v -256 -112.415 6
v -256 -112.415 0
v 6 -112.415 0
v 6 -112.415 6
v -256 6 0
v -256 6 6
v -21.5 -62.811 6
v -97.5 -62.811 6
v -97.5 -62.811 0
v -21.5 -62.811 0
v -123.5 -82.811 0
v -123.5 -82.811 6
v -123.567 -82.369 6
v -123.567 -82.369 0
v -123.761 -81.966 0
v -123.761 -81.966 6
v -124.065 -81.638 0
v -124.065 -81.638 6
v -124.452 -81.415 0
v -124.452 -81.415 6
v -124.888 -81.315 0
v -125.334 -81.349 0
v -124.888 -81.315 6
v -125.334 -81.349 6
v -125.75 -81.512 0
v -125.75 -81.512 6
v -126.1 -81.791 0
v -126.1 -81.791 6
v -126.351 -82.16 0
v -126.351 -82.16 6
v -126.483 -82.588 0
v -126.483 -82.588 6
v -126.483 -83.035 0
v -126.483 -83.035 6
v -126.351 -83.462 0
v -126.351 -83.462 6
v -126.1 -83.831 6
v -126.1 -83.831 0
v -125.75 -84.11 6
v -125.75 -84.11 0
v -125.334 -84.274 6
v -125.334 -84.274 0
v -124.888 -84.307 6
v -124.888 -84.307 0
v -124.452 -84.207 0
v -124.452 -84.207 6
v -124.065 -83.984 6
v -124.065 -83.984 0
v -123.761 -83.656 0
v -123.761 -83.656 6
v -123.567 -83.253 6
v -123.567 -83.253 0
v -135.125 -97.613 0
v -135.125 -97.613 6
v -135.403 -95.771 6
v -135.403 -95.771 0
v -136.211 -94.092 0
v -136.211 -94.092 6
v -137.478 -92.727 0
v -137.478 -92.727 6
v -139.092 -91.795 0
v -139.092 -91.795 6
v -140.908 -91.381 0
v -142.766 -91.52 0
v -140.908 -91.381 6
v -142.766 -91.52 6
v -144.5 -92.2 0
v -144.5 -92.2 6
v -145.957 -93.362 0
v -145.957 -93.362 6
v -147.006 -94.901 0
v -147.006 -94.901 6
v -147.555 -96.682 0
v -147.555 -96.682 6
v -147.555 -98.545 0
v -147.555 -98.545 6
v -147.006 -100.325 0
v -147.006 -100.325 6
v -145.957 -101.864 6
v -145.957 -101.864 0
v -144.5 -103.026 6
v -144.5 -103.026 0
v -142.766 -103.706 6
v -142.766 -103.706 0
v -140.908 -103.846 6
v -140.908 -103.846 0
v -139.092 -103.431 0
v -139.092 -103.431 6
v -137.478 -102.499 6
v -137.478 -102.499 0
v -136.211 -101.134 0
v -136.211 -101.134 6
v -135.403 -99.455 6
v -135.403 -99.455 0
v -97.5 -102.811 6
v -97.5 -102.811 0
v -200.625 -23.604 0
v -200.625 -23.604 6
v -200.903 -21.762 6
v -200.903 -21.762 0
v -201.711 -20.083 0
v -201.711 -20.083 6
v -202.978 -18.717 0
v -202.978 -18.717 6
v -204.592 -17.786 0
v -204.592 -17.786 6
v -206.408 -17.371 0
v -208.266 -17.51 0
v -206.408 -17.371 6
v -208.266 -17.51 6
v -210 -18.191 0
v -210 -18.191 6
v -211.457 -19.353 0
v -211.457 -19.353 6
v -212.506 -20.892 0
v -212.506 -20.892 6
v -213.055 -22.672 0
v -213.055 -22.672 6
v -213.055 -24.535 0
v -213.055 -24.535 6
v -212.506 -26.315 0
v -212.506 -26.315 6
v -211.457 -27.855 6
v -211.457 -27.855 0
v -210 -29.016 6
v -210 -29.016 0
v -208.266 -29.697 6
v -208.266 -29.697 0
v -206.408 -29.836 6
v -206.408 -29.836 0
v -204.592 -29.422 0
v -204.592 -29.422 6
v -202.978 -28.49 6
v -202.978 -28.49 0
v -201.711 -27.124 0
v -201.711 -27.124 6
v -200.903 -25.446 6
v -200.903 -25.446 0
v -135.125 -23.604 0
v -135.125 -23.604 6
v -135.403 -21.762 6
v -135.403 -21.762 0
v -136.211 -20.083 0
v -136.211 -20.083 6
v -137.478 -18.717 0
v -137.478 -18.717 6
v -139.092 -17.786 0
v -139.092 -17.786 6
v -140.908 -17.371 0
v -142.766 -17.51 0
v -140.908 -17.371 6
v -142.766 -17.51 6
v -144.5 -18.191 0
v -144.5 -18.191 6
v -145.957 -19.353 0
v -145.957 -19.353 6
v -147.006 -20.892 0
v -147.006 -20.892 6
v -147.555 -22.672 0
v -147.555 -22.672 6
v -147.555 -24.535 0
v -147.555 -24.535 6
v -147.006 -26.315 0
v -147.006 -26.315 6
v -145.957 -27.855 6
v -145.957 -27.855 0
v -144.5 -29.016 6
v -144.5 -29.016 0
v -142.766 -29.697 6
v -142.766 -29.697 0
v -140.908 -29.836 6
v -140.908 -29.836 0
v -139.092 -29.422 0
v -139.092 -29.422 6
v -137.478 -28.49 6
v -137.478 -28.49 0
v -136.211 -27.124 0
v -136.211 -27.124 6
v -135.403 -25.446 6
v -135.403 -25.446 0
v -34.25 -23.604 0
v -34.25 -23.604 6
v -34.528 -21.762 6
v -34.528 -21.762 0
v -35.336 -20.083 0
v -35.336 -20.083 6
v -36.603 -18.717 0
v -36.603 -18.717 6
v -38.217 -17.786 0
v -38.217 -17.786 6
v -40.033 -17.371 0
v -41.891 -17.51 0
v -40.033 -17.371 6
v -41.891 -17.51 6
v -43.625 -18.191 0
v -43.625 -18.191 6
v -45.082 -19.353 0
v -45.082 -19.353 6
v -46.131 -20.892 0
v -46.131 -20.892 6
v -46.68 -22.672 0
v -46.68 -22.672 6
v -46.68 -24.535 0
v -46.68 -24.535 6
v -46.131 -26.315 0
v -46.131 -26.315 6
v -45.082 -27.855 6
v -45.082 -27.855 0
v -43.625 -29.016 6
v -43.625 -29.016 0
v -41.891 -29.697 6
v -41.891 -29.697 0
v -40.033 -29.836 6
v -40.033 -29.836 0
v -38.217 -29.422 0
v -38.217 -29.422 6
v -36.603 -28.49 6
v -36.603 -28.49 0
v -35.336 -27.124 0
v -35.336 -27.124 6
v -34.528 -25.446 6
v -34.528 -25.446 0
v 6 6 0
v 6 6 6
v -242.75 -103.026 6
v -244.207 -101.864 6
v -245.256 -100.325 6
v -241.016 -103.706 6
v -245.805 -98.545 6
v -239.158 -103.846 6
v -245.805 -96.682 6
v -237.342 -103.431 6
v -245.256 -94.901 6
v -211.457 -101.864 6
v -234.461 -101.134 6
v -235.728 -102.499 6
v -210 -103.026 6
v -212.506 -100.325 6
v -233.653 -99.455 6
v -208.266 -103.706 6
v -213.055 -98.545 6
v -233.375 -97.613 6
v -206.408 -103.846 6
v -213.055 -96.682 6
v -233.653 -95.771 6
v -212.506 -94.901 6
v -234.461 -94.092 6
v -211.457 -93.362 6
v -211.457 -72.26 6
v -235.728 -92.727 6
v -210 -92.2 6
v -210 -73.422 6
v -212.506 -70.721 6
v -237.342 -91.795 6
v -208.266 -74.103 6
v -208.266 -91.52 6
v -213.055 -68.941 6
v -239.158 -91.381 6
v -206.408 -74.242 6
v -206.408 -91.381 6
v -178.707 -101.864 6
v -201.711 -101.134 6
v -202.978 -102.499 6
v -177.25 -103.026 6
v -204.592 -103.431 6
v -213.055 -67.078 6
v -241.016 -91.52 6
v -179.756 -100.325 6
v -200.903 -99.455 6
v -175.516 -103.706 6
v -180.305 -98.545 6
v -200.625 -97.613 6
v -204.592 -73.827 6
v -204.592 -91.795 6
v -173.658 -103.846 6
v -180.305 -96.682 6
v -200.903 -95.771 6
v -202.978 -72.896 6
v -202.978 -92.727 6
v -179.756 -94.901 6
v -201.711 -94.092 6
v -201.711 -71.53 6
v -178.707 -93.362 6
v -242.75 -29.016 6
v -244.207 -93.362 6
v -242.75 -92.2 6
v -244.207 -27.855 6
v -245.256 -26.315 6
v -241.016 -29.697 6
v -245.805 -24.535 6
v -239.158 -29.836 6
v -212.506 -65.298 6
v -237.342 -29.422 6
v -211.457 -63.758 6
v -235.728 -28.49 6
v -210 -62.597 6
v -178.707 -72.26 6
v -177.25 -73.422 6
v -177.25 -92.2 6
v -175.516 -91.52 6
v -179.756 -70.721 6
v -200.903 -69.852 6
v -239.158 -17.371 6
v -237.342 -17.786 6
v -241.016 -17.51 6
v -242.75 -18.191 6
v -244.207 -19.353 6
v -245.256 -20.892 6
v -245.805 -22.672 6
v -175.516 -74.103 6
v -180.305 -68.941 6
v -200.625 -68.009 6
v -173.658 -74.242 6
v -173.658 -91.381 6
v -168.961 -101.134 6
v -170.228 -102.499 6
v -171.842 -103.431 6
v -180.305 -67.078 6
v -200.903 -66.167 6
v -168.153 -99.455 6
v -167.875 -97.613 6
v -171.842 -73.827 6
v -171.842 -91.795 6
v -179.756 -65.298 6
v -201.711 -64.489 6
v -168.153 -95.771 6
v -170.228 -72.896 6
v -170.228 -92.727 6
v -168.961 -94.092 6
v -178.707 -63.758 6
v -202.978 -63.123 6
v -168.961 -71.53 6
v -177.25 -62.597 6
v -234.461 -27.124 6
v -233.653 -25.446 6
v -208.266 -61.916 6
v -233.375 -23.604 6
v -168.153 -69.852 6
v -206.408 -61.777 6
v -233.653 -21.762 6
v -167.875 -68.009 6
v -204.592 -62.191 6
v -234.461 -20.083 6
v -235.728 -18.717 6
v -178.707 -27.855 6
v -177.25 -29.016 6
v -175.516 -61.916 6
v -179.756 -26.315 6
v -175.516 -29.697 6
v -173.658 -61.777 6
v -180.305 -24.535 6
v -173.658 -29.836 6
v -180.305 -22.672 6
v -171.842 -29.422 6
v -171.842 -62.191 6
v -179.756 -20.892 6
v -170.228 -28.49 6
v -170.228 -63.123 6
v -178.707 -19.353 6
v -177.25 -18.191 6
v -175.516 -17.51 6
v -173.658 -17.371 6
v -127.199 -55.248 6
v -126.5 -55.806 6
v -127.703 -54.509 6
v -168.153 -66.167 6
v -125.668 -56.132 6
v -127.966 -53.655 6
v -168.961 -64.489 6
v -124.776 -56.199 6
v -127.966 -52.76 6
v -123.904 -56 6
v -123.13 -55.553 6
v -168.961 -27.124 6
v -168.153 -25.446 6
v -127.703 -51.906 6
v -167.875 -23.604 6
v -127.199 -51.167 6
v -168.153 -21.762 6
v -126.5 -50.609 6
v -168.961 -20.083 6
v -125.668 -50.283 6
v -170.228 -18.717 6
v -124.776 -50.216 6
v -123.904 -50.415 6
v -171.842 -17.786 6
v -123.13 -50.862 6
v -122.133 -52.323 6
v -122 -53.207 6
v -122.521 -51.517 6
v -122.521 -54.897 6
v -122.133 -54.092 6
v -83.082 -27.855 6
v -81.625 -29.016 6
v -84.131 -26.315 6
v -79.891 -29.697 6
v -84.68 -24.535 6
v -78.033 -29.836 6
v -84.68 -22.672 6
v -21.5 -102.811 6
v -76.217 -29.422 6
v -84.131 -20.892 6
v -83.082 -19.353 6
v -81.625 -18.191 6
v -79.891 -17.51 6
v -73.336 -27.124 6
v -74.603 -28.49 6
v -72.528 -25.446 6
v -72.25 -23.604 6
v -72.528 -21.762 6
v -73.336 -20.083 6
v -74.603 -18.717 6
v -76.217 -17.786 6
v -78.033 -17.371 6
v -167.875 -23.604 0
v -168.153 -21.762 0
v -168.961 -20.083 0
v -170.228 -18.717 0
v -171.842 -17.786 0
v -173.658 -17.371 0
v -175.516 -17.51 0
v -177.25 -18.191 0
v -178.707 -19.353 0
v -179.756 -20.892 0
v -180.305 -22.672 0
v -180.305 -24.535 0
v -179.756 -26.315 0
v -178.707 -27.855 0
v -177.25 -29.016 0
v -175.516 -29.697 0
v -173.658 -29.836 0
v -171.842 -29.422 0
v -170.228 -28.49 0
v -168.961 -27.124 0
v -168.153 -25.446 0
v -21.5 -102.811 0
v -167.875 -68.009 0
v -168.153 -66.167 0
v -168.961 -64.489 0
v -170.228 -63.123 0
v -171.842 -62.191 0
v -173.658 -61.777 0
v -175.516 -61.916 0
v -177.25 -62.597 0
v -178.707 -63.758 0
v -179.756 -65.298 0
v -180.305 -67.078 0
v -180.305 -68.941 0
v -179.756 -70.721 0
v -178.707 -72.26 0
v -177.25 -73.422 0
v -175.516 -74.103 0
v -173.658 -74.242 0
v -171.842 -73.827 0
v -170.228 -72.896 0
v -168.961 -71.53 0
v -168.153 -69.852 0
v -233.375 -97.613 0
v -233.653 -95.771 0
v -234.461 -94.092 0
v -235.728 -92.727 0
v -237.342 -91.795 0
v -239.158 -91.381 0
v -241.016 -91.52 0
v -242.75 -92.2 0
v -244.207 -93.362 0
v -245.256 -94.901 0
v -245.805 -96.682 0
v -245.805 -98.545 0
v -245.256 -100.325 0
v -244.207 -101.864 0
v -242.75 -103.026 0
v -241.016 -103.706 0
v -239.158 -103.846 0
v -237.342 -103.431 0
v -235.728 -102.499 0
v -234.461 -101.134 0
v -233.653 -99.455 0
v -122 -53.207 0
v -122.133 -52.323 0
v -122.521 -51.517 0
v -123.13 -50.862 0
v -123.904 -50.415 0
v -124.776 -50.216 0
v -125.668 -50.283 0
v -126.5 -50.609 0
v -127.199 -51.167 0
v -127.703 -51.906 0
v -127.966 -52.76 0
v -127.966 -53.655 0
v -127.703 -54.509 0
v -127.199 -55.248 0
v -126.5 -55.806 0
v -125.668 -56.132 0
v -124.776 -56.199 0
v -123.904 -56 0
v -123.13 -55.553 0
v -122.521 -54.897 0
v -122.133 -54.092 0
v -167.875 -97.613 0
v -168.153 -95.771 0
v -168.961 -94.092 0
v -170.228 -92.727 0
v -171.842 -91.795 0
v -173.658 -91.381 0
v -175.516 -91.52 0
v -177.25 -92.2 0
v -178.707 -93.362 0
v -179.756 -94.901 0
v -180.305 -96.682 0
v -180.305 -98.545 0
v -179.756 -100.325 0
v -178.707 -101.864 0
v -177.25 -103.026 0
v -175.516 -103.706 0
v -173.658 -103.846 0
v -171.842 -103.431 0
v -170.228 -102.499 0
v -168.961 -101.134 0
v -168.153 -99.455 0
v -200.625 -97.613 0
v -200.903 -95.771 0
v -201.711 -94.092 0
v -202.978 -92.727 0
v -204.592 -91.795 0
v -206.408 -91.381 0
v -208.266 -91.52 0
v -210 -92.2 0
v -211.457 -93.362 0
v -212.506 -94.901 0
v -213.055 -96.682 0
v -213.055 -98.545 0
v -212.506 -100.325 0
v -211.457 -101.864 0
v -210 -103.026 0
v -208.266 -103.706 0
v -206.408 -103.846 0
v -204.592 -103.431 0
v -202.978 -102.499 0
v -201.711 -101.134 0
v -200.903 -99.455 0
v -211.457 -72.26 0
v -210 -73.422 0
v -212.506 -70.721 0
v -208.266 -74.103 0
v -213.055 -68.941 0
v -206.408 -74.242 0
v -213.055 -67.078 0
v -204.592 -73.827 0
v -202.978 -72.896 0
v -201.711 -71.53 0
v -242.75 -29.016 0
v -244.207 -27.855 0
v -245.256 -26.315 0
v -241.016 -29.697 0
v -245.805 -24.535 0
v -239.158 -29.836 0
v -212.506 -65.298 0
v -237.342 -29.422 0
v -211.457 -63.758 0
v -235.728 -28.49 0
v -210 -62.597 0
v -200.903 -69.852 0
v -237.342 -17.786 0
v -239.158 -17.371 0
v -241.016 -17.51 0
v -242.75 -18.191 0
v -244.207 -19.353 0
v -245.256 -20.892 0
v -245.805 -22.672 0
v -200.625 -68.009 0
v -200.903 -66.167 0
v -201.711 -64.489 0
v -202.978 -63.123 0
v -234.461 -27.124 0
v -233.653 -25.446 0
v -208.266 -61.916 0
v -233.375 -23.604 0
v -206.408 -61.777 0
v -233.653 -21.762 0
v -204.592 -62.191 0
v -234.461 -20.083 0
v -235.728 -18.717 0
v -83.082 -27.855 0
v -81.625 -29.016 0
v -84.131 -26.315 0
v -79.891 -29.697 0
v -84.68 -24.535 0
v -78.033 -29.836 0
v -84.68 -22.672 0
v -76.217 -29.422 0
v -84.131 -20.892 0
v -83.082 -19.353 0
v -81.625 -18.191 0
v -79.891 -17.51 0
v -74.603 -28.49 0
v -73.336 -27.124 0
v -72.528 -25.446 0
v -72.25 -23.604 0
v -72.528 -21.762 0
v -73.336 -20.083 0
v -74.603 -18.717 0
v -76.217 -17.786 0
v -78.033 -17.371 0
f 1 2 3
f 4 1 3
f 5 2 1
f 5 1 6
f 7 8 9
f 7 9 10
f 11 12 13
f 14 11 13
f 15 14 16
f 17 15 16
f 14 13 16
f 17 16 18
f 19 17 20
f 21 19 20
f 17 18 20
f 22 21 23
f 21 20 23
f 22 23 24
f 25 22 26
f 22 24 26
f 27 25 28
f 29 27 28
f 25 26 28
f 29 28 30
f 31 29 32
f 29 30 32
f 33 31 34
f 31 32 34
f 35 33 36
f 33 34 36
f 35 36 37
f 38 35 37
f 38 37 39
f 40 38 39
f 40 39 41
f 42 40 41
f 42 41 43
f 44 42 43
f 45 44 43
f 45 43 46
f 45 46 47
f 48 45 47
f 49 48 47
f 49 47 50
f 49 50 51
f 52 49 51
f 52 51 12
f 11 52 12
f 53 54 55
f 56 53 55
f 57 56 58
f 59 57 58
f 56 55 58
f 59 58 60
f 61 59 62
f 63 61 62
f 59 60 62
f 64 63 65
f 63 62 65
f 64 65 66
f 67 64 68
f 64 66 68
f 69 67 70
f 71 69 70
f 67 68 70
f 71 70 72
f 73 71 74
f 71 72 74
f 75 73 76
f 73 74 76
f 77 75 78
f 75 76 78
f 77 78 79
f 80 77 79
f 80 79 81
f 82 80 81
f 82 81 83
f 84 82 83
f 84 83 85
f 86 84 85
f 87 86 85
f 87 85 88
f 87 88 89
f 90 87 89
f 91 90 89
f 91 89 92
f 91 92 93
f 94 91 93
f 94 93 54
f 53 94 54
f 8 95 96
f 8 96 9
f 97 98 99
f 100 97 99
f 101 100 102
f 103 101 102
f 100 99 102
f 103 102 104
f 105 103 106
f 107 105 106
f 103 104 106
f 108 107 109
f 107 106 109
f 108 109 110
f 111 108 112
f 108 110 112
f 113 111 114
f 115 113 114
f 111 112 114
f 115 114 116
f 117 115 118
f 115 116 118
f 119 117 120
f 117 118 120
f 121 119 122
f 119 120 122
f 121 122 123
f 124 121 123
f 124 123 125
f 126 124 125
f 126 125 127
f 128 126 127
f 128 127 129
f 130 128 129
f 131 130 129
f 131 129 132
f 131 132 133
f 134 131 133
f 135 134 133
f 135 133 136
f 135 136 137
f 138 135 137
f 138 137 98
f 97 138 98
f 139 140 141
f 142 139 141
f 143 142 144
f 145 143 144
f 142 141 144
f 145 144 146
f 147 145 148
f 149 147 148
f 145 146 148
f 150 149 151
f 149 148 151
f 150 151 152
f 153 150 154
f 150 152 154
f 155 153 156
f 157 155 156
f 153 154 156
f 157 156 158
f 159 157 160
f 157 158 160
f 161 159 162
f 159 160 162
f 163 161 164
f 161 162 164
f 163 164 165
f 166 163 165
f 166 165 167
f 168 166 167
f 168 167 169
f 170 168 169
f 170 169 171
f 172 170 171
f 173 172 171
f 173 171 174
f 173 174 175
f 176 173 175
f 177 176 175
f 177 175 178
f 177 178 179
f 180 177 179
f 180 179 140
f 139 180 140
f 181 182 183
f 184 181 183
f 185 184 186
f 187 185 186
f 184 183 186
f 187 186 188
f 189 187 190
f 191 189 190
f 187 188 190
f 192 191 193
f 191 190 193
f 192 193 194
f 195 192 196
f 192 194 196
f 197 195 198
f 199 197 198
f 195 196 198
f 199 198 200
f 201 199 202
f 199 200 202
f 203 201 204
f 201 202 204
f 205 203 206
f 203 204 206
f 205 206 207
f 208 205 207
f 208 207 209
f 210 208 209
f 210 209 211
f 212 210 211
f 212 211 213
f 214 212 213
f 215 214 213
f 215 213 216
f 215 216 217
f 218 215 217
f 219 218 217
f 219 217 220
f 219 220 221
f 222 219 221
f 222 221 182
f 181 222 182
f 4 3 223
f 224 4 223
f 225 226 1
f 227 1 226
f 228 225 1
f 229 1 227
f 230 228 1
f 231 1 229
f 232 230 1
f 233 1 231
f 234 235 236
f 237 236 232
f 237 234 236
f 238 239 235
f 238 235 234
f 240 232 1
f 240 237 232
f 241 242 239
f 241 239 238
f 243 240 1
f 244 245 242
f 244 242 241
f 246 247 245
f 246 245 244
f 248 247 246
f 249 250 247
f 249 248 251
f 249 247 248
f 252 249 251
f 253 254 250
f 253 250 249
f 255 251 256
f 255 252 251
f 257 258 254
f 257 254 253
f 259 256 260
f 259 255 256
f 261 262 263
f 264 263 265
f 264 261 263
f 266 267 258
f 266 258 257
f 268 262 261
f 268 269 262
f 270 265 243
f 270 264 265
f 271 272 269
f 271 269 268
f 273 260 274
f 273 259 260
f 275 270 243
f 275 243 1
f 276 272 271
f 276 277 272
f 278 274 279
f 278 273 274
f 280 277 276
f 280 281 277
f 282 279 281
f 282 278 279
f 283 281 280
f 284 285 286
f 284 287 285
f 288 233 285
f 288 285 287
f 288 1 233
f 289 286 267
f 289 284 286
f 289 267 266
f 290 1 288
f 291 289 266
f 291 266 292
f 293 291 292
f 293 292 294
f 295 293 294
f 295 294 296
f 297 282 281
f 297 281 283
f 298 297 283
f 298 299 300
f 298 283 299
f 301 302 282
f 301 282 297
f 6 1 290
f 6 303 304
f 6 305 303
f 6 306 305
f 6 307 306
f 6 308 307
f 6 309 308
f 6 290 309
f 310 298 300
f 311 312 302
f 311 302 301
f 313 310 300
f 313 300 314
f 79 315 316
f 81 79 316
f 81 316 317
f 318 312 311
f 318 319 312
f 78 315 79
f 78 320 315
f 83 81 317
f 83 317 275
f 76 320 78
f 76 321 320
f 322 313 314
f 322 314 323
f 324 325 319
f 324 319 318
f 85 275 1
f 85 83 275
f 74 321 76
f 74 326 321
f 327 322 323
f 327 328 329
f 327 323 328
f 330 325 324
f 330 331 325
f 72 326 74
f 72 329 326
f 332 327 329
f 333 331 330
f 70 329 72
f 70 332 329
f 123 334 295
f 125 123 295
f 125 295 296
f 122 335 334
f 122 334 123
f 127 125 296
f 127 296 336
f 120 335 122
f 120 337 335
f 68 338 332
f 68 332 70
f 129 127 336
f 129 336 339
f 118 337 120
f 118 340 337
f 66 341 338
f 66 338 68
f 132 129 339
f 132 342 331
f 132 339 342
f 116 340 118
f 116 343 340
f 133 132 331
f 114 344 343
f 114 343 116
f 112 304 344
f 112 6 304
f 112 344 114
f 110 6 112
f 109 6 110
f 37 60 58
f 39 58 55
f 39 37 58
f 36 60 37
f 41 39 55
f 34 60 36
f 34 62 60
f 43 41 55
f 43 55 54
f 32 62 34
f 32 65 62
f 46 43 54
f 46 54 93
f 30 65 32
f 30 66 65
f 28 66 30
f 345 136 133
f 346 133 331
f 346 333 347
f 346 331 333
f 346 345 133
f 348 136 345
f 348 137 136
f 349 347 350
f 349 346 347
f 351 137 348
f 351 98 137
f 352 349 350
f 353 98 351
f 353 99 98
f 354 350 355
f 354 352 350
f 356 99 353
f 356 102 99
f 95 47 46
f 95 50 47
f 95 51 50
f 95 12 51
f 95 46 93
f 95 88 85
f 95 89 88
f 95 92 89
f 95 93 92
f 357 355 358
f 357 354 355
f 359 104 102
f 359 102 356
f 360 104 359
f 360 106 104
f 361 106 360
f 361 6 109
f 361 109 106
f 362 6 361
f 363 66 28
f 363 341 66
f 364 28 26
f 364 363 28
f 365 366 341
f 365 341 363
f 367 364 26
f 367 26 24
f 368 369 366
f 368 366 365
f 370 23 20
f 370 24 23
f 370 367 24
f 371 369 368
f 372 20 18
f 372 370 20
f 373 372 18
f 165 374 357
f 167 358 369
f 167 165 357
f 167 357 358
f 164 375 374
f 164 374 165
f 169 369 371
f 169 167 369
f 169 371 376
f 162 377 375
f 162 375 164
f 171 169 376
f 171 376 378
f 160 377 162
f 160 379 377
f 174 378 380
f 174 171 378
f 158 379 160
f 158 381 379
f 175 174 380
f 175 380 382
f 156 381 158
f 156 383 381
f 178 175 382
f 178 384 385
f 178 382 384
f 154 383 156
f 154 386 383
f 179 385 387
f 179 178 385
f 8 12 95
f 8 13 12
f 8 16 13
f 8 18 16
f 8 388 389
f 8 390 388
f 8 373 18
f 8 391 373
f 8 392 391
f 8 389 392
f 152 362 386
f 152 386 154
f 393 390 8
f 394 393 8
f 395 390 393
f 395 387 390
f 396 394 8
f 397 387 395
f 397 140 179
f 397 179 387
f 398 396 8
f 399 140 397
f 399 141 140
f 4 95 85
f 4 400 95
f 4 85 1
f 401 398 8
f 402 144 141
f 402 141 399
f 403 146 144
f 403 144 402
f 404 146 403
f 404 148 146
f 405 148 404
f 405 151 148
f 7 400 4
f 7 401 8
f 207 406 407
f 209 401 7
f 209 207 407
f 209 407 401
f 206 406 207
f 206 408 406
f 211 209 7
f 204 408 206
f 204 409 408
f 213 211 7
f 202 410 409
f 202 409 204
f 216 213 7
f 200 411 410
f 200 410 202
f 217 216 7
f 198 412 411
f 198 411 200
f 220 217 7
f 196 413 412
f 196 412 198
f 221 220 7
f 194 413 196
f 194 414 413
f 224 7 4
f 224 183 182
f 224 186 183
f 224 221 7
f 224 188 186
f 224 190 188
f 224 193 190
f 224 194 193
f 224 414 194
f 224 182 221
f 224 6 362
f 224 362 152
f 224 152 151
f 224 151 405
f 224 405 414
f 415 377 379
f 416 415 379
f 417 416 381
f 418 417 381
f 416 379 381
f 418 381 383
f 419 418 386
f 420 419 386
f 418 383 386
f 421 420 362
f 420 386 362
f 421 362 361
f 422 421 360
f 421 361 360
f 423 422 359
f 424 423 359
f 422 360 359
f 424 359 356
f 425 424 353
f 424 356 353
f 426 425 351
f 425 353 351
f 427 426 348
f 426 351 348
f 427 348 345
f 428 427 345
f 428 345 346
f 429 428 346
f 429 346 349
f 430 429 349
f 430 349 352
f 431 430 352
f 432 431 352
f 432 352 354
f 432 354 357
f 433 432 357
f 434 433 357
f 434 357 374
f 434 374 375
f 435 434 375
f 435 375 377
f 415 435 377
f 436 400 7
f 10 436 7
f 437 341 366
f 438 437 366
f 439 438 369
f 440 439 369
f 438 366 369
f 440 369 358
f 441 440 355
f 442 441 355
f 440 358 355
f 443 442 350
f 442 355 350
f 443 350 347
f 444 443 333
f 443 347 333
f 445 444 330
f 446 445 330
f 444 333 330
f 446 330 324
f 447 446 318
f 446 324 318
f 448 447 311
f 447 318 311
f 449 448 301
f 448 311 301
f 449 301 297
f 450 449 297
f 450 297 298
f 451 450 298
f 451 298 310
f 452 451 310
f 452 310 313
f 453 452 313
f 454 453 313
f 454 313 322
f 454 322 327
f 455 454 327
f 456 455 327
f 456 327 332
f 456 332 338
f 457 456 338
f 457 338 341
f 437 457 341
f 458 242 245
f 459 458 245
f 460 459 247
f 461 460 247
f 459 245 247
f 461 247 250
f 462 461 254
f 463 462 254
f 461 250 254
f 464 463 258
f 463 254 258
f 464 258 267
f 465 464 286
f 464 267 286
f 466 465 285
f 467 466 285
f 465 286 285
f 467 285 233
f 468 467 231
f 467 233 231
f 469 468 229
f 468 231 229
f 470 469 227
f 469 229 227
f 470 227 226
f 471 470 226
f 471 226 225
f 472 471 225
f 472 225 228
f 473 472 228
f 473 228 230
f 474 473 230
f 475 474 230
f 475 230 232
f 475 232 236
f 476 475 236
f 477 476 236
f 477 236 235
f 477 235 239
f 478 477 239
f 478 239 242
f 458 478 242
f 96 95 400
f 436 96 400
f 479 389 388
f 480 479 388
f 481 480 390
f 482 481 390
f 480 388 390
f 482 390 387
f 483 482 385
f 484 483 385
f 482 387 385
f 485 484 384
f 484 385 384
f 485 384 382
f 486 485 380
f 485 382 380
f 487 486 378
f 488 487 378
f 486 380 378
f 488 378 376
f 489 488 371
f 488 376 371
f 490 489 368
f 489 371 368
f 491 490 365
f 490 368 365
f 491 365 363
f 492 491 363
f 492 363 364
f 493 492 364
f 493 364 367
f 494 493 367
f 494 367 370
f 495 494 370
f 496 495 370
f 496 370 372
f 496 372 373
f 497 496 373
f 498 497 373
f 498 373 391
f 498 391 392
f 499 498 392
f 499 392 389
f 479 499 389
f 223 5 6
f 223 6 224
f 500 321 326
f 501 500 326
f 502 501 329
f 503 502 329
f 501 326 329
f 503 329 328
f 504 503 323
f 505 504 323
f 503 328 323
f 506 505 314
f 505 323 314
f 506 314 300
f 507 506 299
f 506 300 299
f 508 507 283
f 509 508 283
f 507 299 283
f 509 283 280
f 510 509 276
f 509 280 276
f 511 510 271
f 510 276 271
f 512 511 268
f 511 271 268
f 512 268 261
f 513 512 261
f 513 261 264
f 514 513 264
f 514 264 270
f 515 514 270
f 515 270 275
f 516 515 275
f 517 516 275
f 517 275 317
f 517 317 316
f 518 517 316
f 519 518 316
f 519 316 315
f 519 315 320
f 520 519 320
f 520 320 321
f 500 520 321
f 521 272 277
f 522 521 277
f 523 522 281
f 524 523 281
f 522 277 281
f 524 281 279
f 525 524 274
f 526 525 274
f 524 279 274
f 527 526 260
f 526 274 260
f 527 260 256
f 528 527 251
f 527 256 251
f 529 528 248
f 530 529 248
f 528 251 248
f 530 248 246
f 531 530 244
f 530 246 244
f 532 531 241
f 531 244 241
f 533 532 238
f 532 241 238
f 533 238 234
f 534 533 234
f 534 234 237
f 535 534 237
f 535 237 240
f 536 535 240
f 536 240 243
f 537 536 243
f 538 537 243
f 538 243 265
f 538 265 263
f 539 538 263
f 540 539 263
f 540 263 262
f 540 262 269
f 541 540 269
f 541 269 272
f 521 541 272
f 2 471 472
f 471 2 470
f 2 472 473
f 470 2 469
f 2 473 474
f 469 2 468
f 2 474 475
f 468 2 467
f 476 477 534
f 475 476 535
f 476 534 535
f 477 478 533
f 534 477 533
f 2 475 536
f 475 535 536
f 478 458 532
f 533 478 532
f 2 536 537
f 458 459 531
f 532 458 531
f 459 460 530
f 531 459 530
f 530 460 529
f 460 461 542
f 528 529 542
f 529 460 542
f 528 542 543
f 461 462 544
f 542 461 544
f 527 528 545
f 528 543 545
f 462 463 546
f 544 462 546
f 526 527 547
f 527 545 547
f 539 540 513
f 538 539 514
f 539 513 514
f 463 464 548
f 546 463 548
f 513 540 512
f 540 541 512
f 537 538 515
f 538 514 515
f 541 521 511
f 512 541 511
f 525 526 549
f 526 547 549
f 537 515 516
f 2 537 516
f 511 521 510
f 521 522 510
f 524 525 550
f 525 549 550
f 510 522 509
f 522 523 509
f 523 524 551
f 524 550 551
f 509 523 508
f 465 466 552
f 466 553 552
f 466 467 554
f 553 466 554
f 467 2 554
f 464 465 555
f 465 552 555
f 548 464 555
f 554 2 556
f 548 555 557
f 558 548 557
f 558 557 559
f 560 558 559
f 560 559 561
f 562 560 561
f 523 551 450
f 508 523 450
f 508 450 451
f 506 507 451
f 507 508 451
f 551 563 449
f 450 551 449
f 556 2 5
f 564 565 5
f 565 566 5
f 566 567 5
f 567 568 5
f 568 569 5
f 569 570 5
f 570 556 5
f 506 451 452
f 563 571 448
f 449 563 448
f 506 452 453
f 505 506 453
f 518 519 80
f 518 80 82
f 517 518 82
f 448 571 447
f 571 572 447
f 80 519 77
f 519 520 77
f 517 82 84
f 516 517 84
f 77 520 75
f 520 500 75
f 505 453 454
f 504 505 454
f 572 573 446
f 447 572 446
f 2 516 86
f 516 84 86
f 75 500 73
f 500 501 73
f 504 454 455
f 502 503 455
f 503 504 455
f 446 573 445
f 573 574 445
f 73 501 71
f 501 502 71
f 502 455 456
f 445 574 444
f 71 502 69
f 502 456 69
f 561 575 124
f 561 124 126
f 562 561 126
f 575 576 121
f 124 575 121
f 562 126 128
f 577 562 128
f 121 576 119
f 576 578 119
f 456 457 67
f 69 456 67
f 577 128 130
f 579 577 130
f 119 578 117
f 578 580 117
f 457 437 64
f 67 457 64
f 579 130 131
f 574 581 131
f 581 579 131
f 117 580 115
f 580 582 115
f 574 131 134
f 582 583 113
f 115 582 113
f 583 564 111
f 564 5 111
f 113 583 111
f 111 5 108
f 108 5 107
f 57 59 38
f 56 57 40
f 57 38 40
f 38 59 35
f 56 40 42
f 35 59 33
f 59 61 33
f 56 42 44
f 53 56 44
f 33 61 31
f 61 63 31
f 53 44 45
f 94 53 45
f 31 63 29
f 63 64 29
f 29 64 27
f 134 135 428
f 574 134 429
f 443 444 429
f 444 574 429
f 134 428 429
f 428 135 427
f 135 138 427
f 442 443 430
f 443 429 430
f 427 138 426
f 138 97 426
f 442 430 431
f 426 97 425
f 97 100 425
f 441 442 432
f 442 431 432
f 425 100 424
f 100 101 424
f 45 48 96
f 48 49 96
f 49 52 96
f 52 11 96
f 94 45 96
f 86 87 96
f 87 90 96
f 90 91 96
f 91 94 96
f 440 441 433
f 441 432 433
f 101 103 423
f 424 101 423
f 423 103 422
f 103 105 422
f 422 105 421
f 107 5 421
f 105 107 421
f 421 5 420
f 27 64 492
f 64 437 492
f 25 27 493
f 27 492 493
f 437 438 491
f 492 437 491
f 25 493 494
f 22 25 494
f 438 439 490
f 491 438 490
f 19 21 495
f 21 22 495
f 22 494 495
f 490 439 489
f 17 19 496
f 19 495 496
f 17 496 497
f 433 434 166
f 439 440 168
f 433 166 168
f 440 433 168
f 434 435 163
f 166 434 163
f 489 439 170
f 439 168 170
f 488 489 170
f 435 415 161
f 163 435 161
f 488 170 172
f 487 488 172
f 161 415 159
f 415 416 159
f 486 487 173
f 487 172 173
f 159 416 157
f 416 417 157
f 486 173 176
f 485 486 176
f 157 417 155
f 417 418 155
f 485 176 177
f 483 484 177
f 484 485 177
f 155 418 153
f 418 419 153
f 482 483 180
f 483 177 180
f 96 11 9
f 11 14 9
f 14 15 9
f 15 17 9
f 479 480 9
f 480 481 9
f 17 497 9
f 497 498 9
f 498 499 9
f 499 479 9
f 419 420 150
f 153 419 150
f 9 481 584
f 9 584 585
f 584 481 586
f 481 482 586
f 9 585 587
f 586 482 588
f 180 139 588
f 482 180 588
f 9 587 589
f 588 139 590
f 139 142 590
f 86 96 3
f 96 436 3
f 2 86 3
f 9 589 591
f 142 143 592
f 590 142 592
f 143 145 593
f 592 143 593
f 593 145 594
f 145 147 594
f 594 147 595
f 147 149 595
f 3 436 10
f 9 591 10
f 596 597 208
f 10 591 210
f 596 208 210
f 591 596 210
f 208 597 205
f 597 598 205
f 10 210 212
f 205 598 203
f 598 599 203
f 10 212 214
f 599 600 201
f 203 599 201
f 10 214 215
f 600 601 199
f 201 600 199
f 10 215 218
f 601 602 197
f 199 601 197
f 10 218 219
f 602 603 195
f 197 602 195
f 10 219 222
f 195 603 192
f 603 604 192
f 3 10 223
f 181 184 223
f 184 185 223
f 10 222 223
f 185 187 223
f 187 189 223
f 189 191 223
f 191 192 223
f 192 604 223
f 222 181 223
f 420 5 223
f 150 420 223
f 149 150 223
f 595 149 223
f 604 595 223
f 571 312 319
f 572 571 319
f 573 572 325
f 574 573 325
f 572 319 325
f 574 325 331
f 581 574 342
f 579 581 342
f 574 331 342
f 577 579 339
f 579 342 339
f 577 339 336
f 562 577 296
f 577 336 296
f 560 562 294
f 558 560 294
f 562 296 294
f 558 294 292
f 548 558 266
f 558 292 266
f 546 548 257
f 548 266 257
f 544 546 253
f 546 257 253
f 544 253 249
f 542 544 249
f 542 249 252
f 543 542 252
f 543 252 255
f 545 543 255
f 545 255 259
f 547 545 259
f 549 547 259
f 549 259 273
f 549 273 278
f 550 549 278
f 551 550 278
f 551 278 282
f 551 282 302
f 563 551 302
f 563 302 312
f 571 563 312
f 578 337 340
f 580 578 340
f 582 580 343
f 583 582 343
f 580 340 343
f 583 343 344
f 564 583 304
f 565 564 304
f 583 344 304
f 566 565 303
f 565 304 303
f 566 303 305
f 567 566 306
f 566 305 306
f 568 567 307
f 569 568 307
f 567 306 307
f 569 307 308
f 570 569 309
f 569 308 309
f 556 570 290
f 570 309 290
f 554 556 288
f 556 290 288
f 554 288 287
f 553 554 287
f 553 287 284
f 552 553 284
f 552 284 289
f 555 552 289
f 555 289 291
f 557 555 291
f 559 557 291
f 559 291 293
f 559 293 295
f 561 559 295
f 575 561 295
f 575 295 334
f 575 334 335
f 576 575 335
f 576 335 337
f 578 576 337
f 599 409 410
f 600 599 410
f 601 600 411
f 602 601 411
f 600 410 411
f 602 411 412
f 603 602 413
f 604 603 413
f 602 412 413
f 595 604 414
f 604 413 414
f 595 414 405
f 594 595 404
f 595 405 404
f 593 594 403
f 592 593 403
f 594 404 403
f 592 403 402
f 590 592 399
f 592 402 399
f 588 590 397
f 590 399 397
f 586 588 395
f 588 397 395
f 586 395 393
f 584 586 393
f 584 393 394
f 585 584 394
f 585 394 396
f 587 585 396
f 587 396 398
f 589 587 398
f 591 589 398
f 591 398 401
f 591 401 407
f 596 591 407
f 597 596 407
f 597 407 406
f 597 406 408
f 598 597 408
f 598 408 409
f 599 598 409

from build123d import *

# Parameters (mm, degrees)
ESQUISSE1_W             = 262
ESQUISSE1_H             = 118.414906094
BOSS_EXTRU_1_DEPTH      = 6
ENL_V_MAT_EXTRU_1_REACH = 281.659
ESQUISSE2_R             = 6.25
ESQUISSE2_W             = 76
ESQUISSE2_H             = 40
ENL_V_MAT_EXTRU_2_REACH = 281.659
ESQUISSE3_R             = 3
ESQUISSE3_R_2           = 1.5
ENL_V_MAT_EXTRU_3_REACH = 281.659
ESQUISSE4_R             = 6.25


with BuildPart() as part:
    # Esquisse1 → Boss.-Extru.1 (new body)
    with BuildSketch(Plane.XY):
        with Locations((-125, -53.207453047)):
            Rectangle(ESQUISSE1_W, ESQUISSE1_H)
    extrude(amount=BOSS_EXTRU_1_DEPTH)

    # Esquisse2 → Enlèv. mat.-Extru.1 (cut, up to next)
    with BuildSketch(Plane.XY.offset(6), mode=Mode.PRIVATE) as enl_v_mat_extru_1_sk1:
        with Locations((-40.5, -23.603726524)):
            Circle(ESQUISSE2_R)
    enl_v_mat_extru_1_tool1 = extrude(enl_v_mat_extru_1_sk1.sketch, amount=-ENL_V_MAT_EXTRU_1_REACH, mode=Mode.PRIVATE) & part.part
    # Esquisse2 → Enlèv. mat.-Extru.1 (cut, up to next)
    with BuildSketch(Plane.XY.offset(6), mode=Mode.PRIVATE) as enl_v_mat_extru_1_sk2:
        with Locations((-78.5, -23.603726524)):
            Circle(ESQUISSE2_R)
    enl_v_mat_extru_1_tool2 = extrude(enl_v_mat_extru_1_sk2.sketch, amount=-ENL_V_MAT_EXTRU_1_REACH, mode=Mode.PRIVATE) & part.part
    # Esquisse2 → Enlèv. mat.-Extru.1 (cut, up to next)
    with BuildSketch(Plane.XY.offset(6), mode=Mode.PRIVATE) as enl_v_mat_extru_1_sk3:
        with Locations((-59.5, -82.811179571)):
            Rectangle(ESQUISSE2_W, ESQUISSE2_H)
    enl_v_mat_extru_1_tool3 = extrude(enl_v_mat_extru_1_sk3.sketch, amount=-ENL_V_MAT_EXTRU_1_REACH, mode=Mode.PRIVATE) & part.part
    add(enl_v_mat_extru_1_tool1.solids().sort_by_distance((-40.5, -23.603727, 6))[0], mode=Mode.SUBTRACT)
    add(enl_v_mat_extru_1_tool2.solids().sort_by_distance((-78.5, -23.603727, 6))[0], mode=Mode.SUBTRACT)
    add(enl_v_mat_extru_1_tool3.solids().sort_by_distance((-59.5, -82.81118, 6))[0], mode=Mode.SUBTRACT)

    # Esquisse3 → Enlèv. mat.-Extru.2 (cut, up to next)
    with BuildSketch(Plane.XY.offset(6), mode=Mode.PRIVATE) as enl_v_mat_extru_2_sk1:
        with Locations((-125, -53.207453047)):
            Circle(ESQUISSE3_R)
    enl_v_mat_extru_2_tool1 = extrude(enl_v_mat_extru_2_sk1.sketch, amount=-ENL_V_MAT_EXTRU_2_REACH, mode=Mode.PRIVATE) & part.part
    # Esquisse3 → Enlèv. mat.-Extru.2 (cut, up to next)
    with BuildSketch(Plane.XY.offset(6), mode=Mode.PRIVATE) as enl_v_mat_extru_2_sk2:
        with Locations((-125, -82.811179571)):
            Circle(ESQUISSE3_R_2)
    enl_v_mat_extru_2_tool2 = extrude(enl_v_mat_extru_2_sk2.sketch, amount=-ENL_V_MAT_EXTRU_2_REACH, mode=Mode.PRIVATE) & part.part
    add(enl_v_mat_extru_2_tool1.solids().sort_by_distance((-125, -53.207453, 6))[0], mode=Mode.SUBTRACT)
    add(enl_v_mat_extru_2_tool2.solids().sort_by_distance((-125, -82.81118, 6))[0], mode=Mode.SUBTRACT)

    # Esquisse4 → Enlèv. mat.-Extru.3 (cut, up to next)
    with BuildSketch(Plane.XY.offset(6), mode=Mode.PRIVATE) as enl_v_mat_extru_3_sk1:
        with Locations((-141.375, -97.613042832)):
            Circle(ESQUISSE4_R)
    enl_v_mat_extru_3_tool1 = extrude(enl_v_mat_extru_3_sk1.sketch, amount=-ENL_V_MAT_EXTRU_3_REACH, mode=Mode.PRIVATE) & part.part
    # Esquisse4 → Enlèv. mat.-Extru.3 (cut, up to next)
    with BuildSketch(Plane.XY.offset(6), mode=Mode.PRIVATE) as enl_v_mat_extru_3_sk2:
        with Locations((-174.125, -97.613042832)):
            Circle(ESQUISSE4_R)
    enl_v_mat_extru_3_tool2 = extrude(enl_v_mat_extru_3_sk2.sketch, amount=-ENL_V_MAT_EXTRU_3_REACH, mode=Mode.PRIVATE) & part.part
    # Esquisse4 → Enlèv. mat.-Extru.3 (cut, up to next)
    with BuildSketch(Plane.XY.offset(6), mode=Mode.PRIVATE) as enl_v_mat_extru_3_sk3:
        with Locations((-206.875, -97.613042832)):
            Circle(ESQUISSE4_R)
    enl_v_mat_extru_3_tool3 = extrude(enl_v_mat_extru_3_sk3.sketch, amount=-ENL_V_MAT_EXTRU_3_REACH, mode=Mode.PRIVATE) & part.part
    # Esquisse4 → Enlèv. mat.-Extru.3 (cut, up to next)
    with BuildSketch(Plane.XY.offset(6), mode=Mode.PRIVATE) as enl_v_mat_extru_3_sk4:
        with Locations((-239.625, -97.613042832)):
            Circle(ESQUISSE4_R)
    enl_v_mat_extru_3_tool4 = extrude(enl_v_mat_extru_3_sk4.sketch, amount=-ENL_V_MAT_EXTRU_3_REACH, mode=Mode.PRIVATE) & part.part
    # Esquisse4 → Enlèv. mat.-Extru.3 (cut, up to next)
    with BuildSketch(Plane.XY.offset(6), mode=Mode.PRIVATE) as enl_v_mat_extru_3_sk5:
        with Locations((-174.125, -68.009316309)):
            Circle(ESQUISSE4_R)
    enl_v_mat_extru_3_tool5 = extrude(enl_v_mat_extru_3_sk5.sketch, amount=-ENL_V_MAT_EXTRU_3_REACH, mode=Mode.PRIVATE) & part.part
    # Esquisse4 → Enlèv. mat.-Extru.3 (cut, up to next)
    with BuildSketch(Plane.XY.offset(6), mode=Mode.PRIVATE) as enl_v_mat_extru_3_sk6:
        with Locations((-206.875, -68.009316309)):
            Circle(ESQUISSE4_R)
    enl_v_mat_extru_3_tool6 = extrude(enl_v_mat_extru_3_sk6.sketch, amount=-ENL_V_MAT_EXTRU_3_REACH, mode=Mode.PRIVATE) & part.part
    # Esquisse4 → Enlèv. mat.-Extru.3 (cut, up to next)
    with BuildSketch(Plane.XY.offset(6), mode=Mode.PRIVATE) as enl_v_mat_extru_3_sk7:
        with Locations((-141.375, -23.603726524)):
            Circle(ESQUISSE4_R)
    enl_v_mat_extru_3_tool7 = extrude(enl_v_mat_extru_3_sk7.sketch, amount=-ENL_V_MAT_EXTRU_3_REACH, mode=Mode.PRIVATE) & part.part
    # Esquisse4 → Enlèv. mat.-Extru.3 (cut, up to next)
    with BuildSketch(Plane.XY.offset(6), mode=Mode.PRIVATE) as enl_v_mat_extru_3_sk8:
        with Locations((-174.125, -23.603726524)):
            Circle(ESQUISSE4_R)
    enl_v_mat_extru_3_tool8 = extrude(enl_v_mat_extru_3_sk8.sketch, amount=-ENL_V_MAT_EXTRU_3_REACH, mode=Mode.PRIVATE) & part.part
    # Esquisse4 → Enlèv. mat.-Extru.3 (cut, up to next)
    with BuildSketch(Plane.XY.offset(6), mode=Mode.PRIVATE) as enl_v_mat_extru_3_sk9:
        with Locations((-206.875, -23.603726524)):
            Circle(ESQUISSE4_R)
    enl_v_mat_extru_3_tool9 = extrude(enl_v_mat_extru_3_sk9.sketch, amount=-ENL_V_MAT_EXTRU_3_REACH, mode=Mode.PRIVATE) & part.part
    # Esquisse4 → Enlèv. mat.-Extru.3 (cut, up to next)
    with BuildSketch(Plane.XY.offset(6), mode=Mode.PRIVATE) as enl_v_mat_extru_3_sk10:
        with Locations((-239.625, -23.603726524)):
            Circle(ESQUISSE4_R)
    enl_v_mat_extru_3_tool10 = extrude(enl_v_mat_extru_3_sk10.sketch, amount=-ENL_V_MAT_EXTRU_3_REACH, mode=Mode.PRIVATE) & part.part
    add(enl_v_mat_extru_3_tool1.solids().sort_by_distance((-141.375, -97.613043, 6))[0], mode=Mode.SUBTRACT)
    add(enl_v_mat_extru_3_tool2.solids().sort_by_distance((-174.125, -97.613043, 6))[0], mode=Mode.SUBTRACT)
    add(enl_v_mat_extru_3_tool3.solids().sort_by_distance((-206.875, -97.613043, 6))[0], mode=Mode.SUBTRACT)
    add(enl_v_mat_extru_3_tool4.solids().sort_by_distance((-239.625, -97.613043, 6))[0], mode=Mode.SUBTRACT)
    add(enl_v_mat_extru_3_tool5.solids().sort_by_distance((-174.125, -68.009316, 6))[0], mode=Mode.SUBTRACT)
    add(enl_v_mat_extru_3_tool6.solids().sort_by_distance((-206.875, -68.009316, 6))[0], mode=Mode.SUBTRACT)
    add(enl_v_mat_extru_3_tool7.solids().sort_by_distance((-141.375, -23.603727, 6))[0], mode=Mode.SUBTRACT)
    add(enl_v_mat_extru_3_tool8.solids().sort_by_distance((-174.125, -23.603727, 6))[0], mode=Mode.SUBTRACT)
    add(enl_v_mat_extru_3_tool9.solids().sort_by_distance((-206.875, -23.603727, 6))[0], mode=Mode.SUBTRACT)
    add(enl_v_mat_extru_3_tool10.solids().sort_by_distance((-239.625, -23.603727, 6))[0], mode=Mode.SUBTRACT)


solid = part.part
